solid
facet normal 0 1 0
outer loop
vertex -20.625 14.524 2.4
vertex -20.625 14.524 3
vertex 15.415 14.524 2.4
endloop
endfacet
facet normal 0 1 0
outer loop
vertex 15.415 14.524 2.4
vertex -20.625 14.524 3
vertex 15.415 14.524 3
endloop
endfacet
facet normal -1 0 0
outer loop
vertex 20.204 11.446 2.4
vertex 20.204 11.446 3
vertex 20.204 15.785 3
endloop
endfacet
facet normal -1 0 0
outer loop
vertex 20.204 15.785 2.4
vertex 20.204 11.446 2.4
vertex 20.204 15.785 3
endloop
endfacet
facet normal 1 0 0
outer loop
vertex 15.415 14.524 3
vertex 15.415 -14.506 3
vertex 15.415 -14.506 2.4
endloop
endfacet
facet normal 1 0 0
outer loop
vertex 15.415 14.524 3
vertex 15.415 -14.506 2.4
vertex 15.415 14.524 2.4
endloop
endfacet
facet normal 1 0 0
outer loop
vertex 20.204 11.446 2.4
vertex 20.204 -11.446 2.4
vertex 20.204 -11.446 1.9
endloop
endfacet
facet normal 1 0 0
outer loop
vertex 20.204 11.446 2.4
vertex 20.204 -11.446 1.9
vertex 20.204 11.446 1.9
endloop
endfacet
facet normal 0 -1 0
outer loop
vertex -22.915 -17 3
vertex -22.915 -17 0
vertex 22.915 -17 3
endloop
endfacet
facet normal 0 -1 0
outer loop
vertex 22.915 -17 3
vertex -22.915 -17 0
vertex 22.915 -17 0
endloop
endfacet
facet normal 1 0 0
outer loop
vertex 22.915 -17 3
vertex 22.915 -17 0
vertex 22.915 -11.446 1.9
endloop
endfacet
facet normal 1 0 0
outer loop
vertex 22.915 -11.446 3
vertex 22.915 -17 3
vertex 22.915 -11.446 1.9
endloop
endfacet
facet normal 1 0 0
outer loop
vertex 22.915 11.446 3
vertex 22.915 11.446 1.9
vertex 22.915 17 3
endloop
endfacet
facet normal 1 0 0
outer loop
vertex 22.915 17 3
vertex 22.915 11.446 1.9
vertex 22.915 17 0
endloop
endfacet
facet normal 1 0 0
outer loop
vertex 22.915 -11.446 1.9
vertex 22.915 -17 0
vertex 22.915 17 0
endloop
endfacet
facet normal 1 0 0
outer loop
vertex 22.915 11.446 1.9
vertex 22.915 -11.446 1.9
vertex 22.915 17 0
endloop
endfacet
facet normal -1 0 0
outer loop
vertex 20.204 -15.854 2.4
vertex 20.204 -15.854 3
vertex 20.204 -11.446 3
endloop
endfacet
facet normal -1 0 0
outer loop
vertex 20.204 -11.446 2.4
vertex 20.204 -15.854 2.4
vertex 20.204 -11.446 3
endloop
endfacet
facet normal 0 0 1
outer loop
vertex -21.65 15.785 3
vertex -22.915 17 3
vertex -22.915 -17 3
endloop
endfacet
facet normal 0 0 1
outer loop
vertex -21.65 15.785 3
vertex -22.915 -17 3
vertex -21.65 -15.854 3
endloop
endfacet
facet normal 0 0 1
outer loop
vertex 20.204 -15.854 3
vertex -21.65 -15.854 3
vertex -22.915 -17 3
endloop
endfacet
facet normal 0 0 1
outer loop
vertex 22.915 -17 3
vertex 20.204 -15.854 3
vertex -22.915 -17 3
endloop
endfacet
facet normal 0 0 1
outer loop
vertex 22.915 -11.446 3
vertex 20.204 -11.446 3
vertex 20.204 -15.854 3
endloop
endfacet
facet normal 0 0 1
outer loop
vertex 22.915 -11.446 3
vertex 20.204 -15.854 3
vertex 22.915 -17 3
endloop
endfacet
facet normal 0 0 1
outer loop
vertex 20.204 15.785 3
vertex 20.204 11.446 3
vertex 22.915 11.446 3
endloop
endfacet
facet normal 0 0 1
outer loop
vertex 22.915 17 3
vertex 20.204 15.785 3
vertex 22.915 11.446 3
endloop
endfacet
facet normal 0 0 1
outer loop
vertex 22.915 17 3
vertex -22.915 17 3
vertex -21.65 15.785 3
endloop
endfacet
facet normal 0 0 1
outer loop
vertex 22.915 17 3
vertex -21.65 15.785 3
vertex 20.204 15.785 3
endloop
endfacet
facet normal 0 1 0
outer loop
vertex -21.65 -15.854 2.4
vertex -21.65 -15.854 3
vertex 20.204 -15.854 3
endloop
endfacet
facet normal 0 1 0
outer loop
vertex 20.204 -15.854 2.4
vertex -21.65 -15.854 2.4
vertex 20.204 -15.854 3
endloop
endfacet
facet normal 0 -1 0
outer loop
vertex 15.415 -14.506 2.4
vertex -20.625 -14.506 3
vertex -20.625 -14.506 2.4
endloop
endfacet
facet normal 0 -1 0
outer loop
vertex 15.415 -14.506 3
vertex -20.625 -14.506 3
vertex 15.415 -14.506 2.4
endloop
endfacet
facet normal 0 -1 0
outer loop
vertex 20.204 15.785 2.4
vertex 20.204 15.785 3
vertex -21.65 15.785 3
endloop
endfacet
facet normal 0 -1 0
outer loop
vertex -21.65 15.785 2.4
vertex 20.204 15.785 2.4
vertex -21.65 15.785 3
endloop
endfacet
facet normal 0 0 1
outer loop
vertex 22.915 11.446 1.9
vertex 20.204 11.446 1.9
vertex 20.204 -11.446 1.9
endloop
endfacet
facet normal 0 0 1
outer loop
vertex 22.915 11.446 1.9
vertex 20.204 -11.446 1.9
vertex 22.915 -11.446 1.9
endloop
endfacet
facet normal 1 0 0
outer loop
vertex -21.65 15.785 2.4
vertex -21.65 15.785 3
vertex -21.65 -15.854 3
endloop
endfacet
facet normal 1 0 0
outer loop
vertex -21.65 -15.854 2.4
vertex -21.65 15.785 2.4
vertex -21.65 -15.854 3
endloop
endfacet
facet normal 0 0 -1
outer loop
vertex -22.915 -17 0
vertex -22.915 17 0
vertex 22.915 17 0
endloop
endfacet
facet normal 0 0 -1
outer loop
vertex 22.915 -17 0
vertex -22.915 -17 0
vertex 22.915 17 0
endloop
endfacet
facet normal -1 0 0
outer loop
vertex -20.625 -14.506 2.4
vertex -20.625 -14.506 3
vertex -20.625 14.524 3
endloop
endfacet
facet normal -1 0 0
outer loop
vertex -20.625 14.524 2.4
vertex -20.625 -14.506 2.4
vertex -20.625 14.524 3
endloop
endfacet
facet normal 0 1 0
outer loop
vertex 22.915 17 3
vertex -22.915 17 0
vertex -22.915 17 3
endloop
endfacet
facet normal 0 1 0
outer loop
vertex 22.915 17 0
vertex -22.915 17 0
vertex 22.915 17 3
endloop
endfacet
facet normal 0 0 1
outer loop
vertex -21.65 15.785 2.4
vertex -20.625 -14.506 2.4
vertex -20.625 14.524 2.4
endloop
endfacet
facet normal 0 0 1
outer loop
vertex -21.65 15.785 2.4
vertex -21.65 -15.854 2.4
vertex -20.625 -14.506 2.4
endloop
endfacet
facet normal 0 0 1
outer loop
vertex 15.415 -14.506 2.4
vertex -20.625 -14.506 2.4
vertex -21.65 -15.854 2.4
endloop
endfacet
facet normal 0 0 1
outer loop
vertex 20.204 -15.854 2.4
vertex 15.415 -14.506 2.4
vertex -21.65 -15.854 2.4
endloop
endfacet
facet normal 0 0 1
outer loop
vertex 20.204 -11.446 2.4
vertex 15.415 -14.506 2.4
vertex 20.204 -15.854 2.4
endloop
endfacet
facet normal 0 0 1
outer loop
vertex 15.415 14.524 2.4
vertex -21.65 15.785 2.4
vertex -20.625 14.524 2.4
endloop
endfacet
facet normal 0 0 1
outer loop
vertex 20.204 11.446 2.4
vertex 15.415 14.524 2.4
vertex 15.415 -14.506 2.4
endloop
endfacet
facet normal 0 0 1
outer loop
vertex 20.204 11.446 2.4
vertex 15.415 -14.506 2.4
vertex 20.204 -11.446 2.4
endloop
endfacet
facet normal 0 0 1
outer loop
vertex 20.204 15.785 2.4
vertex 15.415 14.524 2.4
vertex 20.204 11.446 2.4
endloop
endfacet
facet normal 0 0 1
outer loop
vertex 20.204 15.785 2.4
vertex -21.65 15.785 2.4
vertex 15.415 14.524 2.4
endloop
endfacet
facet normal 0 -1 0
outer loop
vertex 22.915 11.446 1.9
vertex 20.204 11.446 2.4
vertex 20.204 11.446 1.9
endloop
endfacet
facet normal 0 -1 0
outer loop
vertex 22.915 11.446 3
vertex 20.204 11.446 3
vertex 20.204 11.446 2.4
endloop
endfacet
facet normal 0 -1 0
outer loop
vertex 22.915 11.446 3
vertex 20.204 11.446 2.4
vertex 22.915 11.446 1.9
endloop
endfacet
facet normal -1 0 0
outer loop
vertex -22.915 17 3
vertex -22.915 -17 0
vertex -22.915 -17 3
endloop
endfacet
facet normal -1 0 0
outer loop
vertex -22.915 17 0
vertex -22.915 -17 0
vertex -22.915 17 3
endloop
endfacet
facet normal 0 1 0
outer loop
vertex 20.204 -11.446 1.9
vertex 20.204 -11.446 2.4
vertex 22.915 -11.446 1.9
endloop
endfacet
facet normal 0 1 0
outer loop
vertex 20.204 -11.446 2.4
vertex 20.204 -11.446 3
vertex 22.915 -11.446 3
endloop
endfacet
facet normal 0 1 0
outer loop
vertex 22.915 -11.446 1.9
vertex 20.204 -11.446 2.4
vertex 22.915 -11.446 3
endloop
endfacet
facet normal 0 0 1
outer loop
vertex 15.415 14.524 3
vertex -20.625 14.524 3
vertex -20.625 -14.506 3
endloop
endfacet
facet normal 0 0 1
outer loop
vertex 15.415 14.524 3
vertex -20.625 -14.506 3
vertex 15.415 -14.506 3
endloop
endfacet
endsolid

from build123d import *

# Parameters (mm, degrees)
F0_W     = 45.83
F0_H     = 34
F1_DEPTH = 3
F2_W     = 36.04
F2_H     = 29.03
F3_DEPTH = 0.6
F2_W_2   = 2.711302
F2_H_2   = 22.891694
F4_DEPTH = 1.1


with BuildPart() as f1:
    # F0 (on Top) → F1 (new body)
    with BuildSketch(Plane.XY):
        Rectangle(F0_W, F0_H)
    extrude(amount=F1_DEPTH)

    # F2 (on face) → F3 (cut)
    with BuildSketch(Plane.XY.offset(3)):
        Polygon((20.203698, 15.784912), (-21.650197, 15.784912), (-21.650197, -15.8541), (20.203698, -15.8541), (20.203698, -11.445847), (20.203698, 11.445847), align=None)
        with Locations((-2.605, 0.008636)):
            Rectangle(F2_W, F2_H, mode=Mode.SUBTRACT)
    extrude(amount=-F3_DEPTH, mode=Mode.SUBTRACT)

    # F2 (on face) → F4 (cut)
    with BuildSketch(Plane.XY.offset(3)):
        with Locations((21.559349, 0)):
            Rectangle(F2_W_2, F2_H_2)
    extrude(amount=-F4_DEPTH, mode=Mode.SUBTRACT)


with BuildPart() as f5_1:
    # F5: copy of F1
    add(f1.part)


solid = f5_1.part
